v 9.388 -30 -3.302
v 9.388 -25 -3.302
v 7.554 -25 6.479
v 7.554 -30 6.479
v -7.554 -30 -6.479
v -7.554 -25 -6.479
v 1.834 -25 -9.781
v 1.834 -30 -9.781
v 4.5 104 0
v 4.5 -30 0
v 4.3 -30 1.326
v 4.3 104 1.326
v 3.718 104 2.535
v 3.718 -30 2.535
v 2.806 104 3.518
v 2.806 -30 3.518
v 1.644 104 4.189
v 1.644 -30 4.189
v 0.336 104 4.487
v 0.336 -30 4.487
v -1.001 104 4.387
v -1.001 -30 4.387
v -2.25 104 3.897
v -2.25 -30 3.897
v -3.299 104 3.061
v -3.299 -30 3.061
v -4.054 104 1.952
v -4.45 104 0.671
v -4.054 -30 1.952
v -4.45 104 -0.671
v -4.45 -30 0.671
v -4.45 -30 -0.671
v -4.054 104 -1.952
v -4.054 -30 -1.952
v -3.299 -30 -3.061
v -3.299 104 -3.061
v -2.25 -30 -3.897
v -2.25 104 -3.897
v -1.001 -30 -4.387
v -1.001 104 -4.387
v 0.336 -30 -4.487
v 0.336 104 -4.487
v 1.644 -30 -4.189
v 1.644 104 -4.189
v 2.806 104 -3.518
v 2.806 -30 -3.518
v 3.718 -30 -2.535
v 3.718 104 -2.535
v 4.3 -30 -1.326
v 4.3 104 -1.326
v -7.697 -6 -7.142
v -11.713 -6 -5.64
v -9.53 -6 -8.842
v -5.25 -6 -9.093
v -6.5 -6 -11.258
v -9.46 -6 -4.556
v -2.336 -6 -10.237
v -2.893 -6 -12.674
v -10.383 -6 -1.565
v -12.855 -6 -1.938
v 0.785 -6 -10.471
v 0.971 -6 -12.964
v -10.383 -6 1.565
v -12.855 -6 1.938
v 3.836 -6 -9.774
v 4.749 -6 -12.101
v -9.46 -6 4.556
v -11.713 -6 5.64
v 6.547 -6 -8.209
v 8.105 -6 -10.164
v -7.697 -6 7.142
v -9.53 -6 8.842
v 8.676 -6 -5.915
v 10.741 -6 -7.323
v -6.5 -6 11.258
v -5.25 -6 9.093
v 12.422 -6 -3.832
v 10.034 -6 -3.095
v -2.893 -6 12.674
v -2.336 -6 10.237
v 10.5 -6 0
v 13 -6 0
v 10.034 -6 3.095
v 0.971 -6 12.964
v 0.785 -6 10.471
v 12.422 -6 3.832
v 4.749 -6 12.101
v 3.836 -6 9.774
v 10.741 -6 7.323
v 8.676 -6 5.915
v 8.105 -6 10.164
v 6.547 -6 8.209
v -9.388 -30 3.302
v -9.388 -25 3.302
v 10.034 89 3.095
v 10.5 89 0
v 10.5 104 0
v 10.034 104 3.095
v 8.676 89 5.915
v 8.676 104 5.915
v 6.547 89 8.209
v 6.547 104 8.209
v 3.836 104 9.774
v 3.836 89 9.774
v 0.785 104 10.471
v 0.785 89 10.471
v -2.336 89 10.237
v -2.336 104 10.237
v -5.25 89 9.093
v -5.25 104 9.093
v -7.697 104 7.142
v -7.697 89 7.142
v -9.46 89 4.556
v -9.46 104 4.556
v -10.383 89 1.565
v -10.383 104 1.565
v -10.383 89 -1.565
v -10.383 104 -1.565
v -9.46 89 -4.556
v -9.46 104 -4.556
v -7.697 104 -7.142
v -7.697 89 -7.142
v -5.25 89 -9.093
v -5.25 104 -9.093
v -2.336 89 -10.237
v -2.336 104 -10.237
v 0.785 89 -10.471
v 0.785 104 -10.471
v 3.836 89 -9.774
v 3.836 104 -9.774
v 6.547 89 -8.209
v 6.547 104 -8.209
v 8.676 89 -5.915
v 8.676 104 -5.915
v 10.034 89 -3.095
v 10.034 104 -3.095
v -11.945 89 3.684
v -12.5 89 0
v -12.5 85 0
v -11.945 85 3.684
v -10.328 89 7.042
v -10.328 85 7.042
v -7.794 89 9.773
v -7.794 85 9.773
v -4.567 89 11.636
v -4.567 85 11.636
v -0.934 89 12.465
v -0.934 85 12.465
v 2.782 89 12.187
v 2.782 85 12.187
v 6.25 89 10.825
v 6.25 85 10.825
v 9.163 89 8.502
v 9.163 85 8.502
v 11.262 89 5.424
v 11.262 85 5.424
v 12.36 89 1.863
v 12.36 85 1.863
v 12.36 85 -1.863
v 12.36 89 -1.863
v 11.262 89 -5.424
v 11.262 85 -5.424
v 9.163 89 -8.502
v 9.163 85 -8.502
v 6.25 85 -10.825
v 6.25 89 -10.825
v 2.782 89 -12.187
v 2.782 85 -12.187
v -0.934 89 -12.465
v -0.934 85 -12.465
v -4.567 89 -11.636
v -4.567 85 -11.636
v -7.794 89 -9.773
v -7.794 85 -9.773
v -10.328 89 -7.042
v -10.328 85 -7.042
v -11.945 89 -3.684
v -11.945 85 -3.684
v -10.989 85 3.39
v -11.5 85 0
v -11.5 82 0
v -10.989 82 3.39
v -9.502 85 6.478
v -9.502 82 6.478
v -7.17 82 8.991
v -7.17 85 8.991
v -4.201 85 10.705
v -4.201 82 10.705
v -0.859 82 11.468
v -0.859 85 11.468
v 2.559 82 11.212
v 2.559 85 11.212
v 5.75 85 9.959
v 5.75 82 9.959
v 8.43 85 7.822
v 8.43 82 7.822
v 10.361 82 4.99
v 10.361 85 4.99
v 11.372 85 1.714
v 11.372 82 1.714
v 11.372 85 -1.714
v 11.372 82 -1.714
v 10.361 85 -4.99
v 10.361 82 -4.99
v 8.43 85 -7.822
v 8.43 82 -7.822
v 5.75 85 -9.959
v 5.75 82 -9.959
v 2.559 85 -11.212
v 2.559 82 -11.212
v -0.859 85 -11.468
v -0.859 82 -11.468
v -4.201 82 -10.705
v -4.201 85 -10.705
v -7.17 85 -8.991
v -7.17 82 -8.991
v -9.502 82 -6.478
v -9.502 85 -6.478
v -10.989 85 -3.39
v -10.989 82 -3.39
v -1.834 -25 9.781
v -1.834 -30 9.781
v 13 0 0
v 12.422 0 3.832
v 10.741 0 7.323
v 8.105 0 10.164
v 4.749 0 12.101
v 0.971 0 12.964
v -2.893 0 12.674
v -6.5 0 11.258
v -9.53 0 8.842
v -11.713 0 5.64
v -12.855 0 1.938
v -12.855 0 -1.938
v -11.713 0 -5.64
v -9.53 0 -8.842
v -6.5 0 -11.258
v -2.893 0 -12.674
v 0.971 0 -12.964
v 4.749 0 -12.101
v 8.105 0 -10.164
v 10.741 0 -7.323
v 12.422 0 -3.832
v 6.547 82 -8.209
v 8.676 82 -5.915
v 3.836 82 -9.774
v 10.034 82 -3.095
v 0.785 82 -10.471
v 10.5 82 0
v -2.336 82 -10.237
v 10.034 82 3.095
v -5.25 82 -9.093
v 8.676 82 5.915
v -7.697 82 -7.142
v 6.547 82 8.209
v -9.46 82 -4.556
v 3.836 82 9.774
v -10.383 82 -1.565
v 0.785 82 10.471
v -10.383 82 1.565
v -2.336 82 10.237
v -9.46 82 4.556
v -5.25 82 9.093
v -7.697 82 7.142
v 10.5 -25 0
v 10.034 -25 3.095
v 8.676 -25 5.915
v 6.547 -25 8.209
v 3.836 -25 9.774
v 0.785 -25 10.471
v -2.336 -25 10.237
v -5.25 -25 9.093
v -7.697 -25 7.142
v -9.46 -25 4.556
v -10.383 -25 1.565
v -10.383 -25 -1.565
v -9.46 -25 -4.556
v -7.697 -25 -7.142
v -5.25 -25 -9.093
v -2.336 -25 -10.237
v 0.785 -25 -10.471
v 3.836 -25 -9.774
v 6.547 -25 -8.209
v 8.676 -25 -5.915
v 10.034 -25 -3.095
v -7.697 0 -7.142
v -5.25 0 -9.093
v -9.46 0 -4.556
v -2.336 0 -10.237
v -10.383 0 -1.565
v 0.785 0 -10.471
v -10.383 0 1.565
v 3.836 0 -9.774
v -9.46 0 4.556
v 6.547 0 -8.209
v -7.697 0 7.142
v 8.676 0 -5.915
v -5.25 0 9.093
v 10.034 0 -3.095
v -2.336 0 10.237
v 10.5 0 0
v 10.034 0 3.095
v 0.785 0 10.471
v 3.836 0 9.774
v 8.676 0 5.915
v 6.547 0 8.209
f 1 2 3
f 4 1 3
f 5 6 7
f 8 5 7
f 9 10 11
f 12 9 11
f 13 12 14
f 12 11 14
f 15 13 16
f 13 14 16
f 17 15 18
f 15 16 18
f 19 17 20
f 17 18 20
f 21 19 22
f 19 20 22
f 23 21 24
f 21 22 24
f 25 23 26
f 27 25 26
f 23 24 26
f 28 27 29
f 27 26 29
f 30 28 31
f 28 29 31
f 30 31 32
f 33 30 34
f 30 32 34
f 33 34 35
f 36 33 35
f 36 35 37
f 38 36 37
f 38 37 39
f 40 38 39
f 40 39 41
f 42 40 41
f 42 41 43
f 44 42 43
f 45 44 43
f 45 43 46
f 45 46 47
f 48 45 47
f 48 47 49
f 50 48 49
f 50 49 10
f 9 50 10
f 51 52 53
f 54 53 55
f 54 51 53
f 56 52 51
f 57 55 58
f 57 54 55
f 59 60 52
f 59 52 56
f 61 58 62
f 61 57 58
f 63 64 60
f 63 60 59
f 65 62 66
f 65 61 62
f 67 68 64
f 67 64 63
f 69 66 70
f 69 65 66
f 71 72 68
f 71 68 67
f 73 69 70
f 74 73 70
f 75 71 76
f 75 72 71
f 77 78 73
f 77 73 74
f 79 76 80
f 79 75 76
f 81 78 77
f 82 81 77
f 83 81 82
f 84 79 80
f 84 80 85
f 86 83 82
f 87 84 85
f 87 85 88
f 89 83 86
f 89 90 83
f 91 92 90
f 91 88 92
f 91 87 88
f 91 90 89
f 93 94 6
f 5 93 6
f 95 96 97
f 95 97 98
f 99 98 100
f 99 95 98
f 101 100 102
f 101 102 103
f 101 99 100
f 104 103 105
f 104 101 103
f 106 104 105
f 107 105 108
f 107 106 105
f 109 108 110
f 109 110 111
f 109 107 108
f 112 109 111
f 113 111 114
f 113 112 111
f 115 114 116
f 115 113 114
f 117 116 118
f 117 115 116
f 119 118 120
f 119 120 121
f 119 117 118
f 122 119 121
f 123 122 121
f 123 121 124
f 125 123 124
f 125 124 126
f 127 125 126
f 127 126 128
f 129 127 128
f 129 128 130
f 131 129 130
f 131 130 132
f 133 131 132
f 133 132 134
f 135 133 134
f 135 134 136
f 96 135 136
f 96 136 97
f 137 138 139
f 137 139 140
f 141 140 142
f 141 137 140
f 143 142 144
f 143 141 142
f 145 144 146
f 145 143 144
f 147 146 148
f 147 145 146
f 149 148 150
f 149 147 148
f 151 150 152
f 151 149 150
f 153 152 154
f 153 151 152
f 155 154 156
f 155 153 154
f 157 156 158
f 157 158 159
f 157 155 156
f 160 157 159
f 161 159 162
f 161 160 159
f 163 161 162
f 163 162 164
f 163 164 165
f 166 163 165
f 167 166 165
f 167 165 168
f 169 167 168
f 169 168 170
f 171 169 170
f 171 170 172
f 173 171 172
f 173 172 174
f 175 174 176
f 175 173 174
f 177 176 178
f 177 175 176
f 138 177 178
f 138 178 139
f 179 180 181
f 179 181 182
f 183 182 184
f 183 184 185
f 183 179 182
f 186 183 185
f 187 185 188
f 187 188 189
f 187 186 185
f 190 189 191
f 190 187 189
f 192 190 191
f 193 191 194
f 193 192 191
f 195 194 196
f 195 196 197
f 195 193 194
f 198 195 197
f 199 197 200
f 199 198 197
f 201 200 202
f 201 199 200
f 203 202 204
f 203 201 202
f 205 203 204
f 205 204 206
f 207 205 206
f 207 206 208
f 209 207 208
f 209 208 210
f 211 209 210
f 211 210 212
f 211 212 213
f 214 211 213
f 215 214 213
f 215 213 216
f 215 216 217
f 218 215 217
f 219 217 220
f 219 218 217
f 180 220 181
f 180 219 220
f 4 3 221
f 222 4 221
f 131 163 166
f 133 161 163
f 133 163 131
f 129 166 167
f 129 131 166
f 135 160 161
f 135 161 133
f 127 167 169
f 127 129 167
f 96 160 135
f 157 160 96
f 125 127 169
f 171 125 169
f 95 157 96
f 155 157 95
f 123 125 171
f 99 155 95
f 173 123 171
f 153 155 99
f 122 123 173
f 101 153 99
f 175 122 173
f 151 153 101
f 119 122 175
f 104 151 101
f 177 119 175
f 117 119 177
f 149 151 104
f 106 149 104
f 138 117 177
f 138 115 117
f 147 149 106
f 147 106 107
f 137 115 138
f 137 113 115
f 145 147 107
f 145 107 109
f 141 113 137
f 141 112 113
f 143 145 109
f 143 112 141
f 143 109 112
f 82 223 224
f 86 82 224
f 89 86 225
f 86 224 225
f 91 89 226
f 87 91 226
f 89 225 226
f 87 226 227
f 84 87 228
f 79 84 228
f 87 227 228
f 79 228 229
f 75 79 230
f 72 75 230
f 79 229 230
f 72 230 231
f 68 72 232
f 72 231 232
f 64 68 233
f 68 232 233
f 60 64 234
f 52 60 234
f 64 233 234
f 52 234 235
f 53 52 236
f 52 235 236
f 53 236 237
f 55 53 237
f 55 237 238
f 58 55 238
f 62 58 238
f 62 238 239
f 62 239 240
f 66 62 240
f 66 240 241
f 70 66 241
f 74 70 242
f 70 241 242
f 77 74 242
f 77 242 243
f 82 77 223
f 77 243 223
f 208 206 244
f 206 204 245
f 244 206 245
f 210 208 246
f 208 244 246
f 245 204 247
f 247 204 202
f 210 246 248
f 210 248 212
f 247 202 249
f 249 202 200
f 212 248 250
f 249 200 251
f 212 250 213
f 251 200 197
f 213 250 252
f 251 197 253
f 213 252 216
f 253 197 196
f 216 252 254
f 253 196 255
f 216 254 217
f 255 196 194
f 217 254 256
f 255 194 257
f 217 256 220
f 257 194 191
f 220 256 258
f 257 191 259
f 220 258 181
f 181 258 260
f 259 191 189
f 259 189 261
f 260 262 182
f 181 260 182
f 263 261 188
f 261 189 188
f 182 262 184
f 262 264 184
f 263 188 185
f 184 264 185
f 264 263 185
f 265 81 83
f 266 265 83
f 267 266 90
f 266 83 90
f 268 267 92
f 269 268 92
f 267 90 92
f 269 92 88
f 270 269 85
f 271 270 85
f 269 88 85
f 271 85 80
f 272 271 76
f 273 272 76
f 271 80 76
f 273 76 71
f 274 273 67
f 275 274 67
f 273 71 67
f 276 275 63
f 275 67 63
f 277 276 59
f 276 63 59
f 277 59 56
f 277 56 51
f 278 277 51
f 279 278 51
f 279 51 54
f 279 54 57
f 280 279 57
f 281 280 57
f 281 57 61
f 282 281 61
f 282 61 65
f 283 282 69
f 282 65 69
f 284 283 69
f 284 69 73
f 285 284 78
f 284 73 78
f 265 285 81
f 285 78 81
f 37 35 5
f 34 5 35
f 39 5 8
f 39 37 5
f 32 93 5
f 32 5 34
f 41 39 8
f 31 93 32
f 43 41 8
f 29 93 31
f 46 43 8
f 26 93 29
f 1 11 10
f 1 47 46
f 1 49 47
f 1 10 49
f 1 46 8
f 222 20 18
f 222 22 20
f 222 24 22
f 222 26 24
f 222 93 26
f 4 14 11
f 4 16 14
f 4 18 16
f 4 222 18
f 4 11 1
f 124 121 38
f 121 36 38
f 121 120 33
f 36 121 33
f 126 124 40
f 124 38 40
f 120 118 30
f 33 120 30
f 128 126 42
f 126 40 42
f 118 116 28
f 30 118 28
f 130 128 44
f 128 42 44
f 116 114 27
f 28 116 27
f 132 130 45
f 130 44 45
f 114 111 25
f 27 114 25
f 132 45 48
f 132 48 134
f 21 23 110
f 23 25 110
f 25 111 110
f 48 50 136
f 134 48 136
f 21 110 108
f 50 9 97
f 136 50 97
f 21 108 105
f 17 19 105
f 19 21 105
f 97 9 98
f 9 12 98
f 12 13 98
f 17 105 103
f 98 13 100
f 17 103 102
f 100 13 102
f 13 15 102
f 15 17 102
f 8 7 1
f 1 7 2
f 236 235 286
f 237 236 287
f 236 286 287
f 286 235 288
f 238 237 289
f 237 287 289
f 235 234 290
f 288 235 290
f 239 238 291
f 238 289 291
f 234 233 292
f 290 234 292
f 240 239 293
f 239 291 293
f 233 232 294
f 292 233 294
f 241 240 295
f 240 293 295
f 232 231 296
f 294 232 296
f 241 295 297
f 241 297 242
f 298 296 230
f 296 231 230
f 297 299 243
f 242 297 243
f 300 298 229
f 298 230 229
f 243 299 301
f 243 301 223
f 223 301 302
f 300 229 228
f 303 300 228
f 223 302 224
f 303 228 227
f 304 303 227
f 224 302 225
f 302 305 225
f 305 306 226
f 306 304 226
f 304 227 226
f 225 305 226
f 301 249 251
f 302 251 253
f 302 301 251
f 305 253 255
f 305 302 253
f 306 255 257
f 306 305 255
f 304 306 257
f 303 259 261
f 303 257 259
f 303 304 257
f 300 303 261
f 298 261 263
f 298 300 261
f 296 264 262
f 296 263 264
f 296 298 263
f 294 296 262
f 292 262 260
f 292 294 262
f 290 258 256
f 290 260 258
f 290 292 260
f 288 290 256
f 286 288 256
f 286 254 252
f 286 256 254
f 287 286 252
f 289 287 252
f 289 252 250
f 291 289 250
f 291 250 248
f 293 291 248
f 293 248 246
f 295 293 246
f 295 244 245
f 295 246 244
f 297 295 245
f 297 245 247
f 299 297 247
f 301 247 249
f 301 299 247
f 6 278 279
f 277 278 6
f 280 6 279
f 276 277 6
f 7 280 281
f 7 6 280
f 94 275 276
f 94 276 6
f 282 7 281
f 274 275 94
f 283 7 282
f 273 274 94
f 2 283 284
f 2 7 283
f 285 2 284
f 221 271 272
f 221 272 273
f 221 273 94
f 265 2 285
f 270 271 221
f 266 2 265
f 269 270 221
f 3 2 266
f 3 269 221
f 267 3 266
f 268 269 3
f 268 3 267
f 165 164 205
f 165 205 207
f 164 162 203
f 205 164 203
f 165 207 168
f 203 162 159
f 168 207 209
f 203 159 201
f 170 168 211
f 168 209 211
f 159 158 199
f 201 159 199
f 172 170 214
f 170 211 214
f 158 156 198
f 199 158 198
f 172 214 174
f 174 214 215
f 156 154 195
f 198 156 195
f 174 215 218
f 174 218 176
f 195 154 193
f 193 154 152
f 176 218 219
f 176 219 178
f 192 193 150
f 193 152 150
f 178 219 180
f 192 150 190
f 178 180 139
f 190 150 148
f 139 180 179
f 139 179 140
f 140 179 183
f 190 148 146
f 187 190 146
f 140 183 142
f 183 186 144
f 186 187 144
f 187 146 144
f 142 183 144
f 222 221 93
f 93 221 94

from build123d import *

# Parameters (mm, degrees)
F0_R          = 13
F1_DEPTH      = 6
F2_R          = 10.5
F3_DEPTH      = 19
F3_DEPTH_BACK = 110
F6_START      = -19
F5_R          = 11.5
F5_R_2        = 10.5
F6_DEPTH      = 3
F8_START      = -15
F7_R          = 12.5
F7_R_2        = 10.5
F8_DEPTH      = 4
F10_DEPTH     = 5
F11_R         = 4.5
F12_DEPTH     = 153


with BuildPart() as f1:
    # F0 (on Front) → F1 (new body)
    with BuildSketch(Plane.XZ):
        Circle(F0_R)
    extrude(amount=F1_DEPTH)

    # F2 (on face) → F3 (join, two sides)
    with BuildSketch(Plane.XZ.offset(6)) as f3_sk:
        Circle(F2_R)
    extrude(amount=F3_DEPTH)
    extrude(f3_sk.sketch, amount=-F3_DEPTH_BACK)

    # F5 (on face) → F6 (join)
    with BuildSketch(Plane(origin=(0, 104, 0), x_dir=(-1, 0, 0), z_dir=(0, 1, 0)).offset(F6_START)):
        Circle(F5_R)
        Circle(F5_R_2, mode=Mode.SUBTRACT)
    extrude(amount=-F6_DEPTH)

    # F7 (on face) → F8 (join)
    with BuildSketch(Plane(origin=(0, 104, 0), x_dir=(-1, 0, 0), z_dir=(0, 1, 0)).offset(F8_START)):
        Circle(F7_R)
        Circle(F7_R_2, mode=Mode.SUBTRACT)
    extrude(amount=-F8_DEPTH)

    # F9 (on face) → F10 (join)
    with BuildSketch(Plane.XZ.offset(25)):
        Polygon((9.3875564858, -3.3022610956), (7.5536202416, 6.4787318484), (-1.8339362442, 9.780992944), (-9.3875564858, 3.3022610956), (-7.5536202416, -6.4787318484), (1.8339362442, -9.780992944), align=None)
    extrude(amount=F10_DEPTH)

    # F11 (on face) → F12 (cut)
    with BuildSketch(Plane.XZ.offset(30)):
        Circle(F11_R)
    extrude(amount=-F12_DEPTH, mode=Mode.SUBTRACT)


solid = f1.part
